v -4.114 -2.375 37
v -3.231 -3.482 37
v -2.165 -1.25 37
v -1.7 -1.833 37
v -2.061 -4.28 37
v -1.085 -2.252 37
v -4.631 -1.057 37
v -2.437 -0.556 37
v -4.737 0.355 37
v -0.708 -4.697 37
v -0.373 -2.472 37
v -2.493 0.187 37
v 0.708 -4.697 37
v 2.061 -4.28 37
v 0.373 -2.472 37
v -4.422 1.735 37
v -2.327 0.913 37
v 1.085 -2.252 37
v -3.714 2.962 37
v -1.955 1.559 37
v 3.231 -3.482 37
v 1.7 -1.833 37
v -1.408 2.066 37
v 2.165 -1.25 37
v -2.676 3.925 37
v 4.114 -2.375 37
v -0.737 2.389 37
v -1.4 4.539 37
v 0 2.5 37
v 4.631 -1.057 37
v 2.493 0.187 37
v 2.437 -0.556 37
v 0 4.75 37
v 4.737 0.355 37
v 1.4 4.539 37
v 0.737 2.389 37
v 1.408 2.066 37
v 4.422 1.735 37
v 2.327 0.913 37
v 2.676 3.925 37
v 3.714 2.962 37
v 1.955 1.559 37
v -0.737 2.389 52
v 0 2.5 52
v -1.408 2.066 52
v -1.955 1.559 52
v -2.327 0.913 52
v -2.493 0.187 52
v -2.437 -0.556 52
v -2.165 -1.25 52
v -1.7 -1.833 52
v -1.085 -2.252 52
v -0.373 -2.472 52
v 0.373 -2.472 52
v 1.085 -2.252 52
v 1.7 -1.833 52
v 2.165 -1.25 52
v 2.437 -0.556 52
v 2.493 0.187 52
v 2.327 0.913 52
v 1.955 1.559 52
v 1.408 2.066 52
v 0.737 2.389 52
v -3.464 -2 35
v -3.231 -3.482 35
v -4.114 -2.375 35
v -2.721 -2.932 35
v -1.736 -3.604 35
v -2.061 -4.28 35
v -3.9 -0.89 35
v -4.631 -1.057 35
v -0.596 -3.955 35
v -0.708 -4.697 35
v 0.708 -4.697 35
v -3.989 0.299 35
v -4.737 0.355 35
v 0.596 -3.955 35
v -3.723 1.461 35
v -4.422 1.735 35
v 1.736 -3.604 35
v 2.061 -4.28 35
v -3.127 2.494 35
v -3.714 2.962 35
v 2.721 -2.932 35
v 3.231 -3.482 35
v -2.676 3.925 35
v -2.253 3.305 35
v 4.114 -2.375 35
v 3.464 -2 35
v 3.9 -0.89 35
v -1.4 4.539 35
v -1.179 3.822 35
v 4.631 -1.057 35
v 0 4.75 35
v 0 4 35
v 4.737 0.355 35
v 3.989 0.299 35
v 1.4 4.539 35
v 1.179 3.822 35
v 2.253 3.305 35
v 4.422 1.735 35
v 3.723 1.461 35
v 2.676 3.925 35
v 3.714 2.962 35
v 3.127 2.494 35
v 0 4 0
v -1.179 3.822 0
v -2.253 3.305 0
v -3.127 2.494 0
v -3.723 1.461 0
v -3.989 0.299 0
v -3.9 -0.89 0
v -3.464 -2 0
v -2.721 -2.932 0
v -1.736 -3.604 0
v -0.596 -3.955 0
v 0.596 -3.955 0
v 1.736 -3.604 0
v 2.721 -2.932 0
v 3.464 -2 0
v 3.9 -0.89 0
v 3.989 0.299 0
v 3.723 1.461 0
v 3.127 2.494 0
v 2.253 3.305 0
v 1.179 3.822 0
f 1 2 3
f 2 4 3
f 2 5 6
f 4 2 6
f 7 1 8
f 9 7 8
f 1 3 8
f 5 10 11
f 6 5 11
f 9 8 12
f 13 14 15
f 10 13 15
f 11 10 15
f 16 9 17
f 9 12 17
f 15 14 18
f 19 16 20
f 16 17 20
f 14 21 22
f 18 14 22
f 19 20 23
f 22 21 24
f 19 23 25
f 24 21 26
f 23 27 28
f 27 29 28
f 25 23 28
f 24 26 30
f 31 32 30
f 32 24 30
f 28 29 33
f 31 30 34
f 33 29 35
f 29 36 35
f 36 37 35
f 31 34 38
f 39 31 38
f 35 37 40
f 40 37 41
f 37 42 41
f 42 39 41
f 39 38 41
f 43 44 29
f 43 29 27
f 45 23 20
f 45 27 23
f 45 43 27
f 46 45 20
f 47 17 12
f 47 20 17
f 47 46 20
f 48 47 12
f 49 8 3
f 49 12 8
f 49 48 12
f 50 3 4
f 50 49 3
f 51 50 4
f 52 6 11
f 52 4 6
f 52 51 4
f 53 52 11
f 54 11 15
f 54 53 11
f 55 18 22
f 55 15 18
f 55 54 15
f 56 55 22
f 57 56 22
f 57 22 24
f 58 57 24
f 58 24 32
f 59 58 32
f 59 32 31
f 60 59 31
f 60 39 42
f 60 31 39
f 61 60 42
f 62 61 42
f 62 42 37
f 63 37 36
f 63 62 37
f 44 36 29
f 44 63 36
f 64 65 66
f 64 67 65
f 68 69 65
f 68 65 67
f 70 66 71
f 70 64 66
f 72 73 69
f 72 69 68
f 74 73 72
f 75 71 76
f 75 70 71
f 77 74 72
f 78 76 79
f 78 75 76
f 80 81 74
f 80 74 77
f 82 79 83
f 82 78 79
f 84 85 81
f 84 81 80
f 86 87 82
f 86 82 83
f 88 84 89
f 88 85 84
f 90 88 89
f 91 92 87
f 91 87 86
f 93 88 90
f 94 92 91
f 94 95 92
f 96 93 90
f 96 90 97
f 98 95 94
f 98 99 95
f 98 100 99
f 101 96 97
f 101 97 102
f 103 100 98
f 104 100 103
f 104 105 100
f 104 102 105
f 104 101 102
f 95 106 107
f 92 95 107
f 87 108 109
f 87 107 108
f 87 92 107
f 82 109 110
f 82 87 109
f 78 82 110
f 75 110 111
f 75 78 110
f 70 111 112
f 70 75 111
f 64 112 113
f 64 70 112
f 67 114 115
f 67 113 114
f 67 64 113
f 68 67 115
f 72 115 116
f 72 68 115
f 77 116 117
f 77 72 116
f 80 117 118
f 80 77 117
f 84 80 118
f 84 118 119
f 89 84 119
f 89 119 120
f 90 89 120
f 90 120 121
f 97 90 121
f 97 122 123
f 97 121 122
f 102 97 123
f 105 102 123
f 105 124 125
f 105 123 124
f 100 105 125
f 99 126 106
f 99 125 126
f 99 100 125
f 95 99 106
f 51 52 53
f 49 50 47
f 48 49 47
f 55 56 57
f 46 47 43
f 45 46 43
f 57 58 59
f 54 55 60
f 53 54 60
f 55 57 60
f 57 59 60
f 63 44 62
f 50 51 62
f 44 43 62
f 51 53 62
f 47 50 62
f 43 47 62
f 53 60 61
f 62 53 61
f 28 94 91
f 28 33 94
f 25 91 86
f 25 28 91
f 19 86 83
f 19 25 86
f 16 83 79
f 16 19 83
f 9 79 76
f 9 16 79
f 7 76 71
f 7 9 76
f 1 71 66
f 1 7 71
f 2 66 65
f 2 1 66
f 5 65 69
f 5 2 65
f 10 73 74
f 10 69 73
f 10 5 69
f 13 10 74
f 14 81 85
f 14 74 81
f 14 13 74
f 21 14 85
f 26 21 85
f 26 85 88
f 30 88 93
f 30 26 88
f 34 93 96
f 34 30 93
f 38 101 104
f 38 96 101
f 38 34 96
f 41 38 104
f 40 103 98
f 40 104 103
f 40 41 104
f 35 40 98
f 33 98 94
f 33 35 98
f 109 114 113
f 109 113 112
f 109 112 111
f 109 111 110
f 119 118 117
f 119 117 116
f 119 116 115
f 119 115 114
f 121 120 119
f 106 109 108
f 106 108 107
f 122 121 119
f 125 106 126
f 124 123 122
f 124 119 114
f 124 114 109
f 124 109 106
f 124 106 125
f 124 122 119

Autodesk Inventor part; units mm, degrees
ref_plane "YZ Plane" through (0, 0, 0) normal (1, 0, 0) x (0, 1, 0)
ref_plane "XZ Plane" through (0, 0, 0) normal (0, 1, 0) x (-1, 0, 0)
ref_plane "XY Plane" through (0, 0, 0) normal (0, 0, 1) x (1, 0, 0)
sketch "Sketch1" plane through (0, 0, 0) normal (1, 0, 0) x (0, 1, 0)
  line L0 (0, 0) -> (4, 0)
  line L1 (4, 0) -> (4, 35)
  line L2 (4, 35) -> (4.75, 35)
  line L3 (4.75, 35) -> (4.75, 37)
  line L4 (4.75, 37) -> (2.5, 37)
  line L5 (2.5, 37) -> (2.5, 52)
  line L6 (2.5, 52) -> (0, 52)
  line L7 (0, 52) -> (0, 0)
  dimension "d0" = 4
  dimension "d1" = 4.75
  dimension "d2" = 35
  dimension "d3" = 2
  dimension "d4" = 15
  dimension "d5" = 2.5
revolve "Revolution1" add sketch "Sketch1" angle 360 about axis through (0, 0, 52) along (0, 0, -1)
sketch "Sketch2" plane through (0, 0, 0) normal (0, 0, -1) x (-1, 0, 0)
  circle A0 centre (0, 0) radius 4 construction
  circle A1 centre (0, 0) radius 3.9688
  dimension "d12" = 7.9375
properties part number "hobbing_jig_shaft"
